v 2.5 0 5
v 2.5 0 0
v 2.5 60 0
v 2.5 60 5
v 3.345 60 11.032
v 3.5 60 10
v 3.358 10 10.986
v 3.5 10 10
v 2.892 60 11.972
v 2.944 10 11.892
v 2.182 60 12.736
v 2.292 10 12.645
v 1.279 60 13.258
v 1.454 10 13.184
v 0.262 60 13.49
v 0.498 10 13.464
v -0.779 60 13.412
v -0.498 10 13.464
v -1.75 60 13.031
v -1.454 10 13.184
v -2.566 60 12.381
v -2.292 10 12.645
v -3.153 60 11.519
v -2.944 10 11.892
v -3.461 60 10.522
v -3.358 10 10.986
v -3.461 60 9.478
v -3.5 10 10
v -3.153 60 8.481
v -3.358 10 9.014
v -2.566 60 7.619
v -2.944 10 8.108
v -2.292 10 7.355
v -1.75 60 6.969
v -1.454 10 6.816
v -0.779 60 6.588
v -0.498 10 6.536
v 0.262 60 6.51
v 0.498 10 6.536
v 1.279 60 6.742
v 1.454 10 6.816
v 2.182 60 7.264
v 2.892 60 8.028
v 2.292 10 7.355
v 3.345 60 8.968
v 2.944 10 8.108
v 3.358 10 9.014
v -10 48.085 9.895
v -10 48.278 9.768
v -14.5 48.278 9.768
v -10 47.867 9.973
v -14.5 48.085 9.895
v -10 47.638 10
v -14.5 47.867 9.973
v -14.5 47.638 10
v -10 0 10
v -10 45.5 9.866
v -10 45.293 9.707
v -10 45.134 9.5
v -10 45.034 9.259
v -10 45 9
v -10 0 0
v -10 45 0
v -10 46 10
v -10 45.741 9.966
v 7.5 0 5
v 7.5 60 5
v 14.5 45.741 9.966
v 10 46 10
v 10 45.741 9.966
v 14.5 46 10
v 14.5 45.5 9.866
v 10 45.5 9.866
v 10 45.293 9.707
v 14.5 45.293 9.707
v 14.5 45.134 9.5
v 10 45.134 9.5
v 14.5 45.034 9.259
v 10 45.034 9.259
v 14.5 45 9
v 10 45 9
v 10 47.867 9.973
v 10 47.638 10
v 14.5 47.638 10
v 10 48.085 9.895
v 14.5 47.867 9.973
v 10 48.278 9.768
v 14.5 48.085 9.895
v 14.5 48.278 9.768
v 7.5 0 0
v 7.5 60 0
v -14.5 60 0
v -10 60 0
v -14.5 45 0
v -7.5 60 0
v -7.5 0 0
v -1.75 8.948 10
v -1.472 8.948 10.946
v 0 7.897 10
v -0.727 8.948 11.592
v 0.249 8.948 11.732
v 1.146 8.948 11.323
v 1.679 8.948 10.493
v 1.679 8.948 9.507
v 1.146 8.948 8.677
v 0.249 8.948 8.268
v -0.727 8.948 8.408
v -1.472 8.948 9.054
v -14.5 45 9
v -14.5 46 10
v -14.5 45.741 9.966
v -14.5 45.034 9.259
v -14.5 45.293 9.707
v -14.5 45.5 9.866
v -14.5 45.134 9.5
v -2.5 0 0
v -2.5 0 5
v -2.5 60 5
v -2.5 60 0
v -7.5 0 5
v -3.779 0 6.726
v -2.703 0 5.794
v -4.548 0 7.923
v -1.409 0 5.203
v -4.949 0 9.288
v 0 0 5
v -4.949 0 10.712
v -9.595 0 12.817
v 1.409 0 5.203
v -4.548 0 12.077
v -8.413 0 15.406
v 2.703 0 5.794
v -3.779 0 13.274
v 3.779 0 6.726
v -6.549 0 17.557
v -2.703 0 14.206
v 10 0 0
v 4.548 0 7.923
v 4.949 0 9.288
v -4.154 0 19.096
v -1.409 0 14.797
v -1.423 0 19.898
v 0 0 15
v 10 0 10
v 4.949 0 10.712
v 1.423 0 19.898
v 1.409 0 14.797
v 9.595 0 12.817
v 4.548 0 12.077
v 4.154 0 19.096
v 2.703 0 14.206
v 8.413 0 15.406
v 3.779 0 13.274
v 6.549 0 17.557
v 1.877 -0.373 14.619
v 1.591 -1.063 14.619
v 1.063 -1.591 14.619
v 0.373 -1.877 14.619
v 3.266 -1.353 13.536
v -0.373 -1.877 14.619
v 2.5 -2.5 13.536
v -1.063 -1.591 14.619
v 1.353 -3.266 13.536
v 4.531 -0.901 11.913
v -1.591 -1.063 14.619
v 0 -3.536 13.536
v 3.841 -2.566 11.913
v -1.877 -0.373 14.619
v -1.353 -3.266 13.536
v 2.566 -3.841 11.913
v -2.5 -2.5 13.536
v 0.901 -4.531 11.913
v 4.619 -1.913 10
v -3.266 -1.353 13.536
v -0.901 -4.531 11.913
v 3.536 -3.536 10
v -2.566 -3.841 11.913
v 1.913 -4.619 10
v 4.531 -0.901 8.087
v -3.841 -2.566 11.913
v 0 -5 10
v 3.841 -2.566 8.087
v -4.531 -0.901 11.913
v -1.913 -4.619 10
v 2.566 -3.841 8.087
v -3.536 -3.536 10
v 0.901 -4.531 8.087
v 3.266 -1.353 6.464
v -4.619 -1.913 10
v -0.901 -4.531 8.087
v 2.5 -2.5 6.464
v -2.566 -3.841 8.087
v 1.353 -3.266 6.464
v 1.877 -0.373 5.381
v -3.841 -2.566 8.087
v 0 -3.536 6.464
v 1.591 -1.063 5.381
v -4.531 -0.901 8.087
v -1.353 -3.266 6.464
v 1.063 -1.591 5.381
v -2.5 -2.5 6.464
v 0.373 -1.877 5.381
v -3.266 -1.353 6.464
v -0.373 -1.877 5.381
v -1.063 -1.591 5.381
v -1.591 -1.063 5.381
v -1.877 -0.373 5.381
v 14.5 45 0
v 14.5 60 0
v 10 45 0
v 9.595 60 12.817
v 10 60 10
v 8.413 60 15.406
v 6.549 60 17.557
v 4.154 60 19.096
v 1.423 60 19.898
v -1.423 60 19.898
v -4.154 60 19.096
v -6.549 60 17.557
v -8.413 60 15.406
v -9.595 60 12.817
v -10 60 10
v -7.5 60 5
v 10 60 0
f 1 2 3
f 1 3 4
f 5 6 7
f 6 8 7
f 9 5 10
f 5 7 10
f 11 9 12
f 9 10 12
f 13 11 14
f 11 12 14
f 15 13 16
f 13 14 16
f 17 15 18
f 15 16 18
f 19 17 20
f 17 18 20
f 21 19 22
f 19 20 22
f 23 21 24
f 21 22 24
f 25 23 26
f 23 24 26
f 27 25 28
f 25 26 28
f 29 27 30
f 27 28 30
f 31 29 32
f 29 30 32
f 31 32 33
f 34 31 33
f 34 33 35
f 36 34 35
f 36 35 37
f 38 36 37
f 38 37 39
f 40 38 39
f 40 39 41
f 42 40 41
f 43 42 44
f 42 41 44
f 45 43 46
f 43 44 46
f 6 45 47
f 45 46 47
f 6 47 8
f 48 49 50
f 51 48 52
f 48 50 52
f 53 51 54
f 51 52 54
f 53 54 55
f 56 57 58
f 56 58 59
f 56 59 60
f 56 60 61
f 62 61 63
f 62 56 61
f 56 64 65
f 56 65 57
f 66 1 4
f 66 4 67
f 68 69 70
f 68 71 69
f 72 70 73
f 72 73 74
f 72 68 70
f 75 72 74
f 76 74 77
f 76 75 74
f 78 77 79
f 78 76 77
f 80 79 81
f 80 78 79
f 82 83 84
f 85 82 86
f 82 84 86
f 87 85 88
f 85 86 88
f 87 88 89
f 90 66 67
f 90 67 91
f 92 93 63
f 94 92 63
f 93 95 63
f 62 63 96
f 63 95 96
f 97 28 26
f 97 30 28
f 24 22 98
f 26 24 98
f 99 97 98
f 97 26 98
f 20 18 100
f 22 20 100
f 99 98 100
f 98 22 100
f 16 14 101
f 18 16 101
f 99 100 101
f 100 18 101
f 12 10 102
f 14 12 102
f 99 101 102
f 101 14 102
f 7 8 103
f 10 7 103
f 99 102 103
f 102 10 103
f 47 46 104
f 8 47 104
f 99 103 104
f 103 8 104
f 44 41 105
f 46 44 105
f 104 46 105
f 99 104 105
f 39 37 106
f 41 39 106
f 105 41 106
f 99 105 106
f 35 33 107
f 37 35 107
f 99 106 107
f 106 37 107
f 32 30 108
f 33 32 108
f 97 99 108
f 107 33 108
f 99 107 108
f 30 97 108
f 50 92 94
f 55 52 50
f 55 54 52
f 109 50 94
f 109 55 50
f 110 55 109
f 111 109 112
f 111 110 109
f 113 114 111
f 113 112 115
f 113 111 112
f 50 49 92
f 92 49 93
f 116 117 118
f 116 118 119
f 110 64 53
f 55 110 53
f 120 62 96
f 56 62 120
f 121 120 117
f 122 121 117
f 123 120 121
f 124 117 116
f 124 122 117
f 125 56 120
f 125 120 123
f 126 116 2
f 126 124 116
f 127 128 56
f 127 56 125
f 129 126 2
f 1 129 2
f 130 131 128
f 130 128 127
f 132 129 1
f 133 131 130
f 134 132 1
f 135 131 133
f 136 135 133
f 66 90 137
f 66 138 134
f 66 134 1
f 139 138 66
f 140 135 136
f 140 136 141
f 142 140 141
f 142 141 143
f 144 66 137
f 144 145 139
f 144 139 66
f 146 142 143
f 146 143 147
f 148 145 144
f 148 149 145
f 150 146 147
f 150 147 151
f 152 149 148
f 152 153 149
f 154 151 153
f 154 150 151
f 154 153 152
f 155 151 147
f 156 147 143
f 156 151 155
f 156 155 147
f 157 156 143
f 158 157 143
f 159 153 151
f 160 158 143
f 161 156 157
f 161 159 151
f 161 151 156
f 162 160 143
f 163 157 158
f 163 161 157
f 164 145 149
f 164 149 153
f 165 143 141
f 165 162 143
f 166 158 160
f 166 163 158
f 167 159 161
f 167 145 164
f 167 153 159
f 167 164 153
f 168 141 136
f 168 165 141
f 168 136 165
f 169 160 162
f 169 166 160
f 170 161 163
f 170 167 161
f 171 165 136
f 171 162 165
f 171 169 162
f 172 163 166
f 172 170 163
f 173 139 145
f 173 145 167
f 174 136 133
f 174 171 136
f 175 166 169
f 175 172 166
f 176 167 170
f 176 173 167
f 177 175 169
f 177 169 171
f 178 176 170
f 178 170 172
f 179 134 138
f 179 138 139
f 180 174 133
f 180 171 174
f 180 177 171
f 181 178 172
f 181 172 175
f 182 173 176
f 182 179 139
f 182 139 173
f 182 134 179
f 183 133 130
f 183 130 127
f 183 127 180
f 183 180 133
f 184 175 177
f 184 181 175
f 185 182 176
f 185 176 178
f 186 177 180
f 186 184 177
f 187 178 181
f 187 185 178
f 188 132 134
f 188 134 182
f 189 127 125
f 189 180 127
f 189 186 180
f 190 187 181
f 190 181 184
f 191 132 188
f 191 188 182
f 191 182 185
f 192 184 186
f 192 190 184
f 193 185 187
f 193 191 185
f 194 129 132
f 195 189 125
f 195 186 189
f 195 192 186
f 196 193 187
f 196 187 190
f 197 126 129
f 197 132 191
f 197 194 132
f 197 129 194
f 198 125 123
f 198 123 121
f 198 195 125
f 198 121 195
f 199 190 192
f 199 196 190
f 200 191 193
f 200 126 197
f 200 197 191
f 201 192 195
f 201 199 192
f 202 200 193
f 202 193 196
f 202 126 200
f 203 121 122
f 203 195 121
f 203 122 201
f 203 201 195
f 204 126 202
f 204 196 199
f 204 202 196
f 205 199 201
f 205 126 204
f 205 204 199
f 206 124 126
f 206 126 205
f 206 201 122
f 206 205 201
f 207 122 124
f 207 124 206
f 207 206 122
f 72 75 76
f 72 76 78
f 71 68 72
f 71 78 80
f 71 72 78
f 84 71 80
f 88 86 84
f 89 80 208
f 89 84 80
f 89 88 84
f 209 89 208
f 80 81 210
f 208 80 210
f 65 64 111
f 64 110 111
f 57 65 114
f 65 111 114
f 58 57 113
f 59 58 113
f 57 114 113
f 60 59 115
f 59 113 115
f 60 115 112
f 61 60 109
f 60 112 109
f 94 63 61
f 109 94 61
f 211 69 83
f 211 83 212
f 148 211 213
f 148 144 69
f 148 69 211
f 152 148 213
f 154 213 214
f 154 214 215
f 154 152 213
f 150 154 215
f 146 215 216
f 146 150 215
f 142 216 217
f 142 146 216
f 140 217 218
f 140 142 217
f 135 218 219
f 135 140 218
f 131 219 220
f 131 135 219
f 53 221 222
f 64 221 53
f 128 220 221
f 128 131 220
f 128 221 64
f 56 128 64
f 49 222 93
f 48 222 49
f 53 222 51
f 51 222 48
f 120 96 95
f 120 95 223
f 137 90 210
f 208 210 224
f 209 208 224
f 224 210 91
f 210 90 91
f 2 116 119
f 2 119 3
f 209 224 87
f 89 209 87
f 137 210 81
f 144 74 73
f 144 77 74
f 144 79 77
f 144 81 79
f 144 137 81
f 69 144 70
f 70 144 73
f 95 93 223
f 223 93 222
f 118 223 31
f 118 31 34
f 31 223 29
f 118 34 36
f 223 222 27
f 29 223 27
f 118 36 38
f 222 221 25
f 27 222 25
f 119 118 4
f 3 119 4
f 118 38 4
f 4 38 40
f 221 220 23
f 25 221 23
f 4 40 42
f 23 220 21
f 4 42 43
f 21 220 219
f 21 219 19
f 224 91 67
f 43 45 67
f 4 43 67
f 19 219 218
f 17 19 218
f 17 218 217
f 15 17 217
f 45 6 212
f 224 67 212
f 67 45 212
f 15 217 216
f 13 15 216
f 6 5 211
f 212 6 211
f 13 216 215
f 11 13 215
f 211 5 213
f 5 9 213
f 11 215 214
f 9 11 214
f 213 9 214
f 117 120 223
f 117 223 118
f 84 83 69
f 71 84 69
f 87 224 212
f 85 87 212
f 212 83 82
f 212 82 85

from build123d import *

# Parameters (mm, degrees)
F1_DEPTH = 60
F5_D     = 7
F5_DEPTH = 50
F5_TIP   = 2.1030121666
F7_DEPTH = 4.5
F9_DEPTH = 4.5
F10_R    = 1


with BuildPart() as f1:
    # F0 (on Front) → F1 (new body)
    with BuildSketch(Plane.XZ):
        with BuildLine():
            Line((-10, 10), (-10, 0))
            Line((-10, 0), (-7.5, 0))
            Line((-7.5, 0), (-7.5, 5))
            Line((-7.5, 5), (-2.5, 5))
            Line((-2.5, 5), (-2.5, 0))
            Line((-2.5, 0), (2.5, 0))
            Line((2.5, 0), (2.5, 5))
            Line((2.5, 5), (7.5, 5))
            Line((7.5, 5), (7.5, 0))
            Line((7.5, 0), (10, 0))
            Line((10, 0), (10, 10))
            ThreePointArc((10, 10), (0, 20), (-10, 10))
        make_face()
    extrude(amount=-F1_DEPTH)

    # F2 (on Right) → F3 (revolve)
    with BuildSketch(Plane.YZ):
        with BuildLine():
            Line((0, 5), (0, 15))
            ThreePointArc((0, 15), (-5, 10), (0, 5))
        make_face()
    revolve(axis=Axis((0, 0, 10), (0, 0, -1)))

    # F5
    with Locations(Plane(origin=(0, 60, 0), x_dir=(-1, 0, 0), z_dir=(0, 1, 0))):
        with Locations((0, 10)):
            Hole(F5_D / 2, depth=F5_DEPTH)
            with Locations((0, 0, -(F5_DEPTH + F5_TIP / 2))):  # 118° drill point
                Cone(0, F5_D / 2, F5_TIP, mode=Mode.SUBTRACT)

    # F6 (on face) → F7 (join)
    with BuildSketch(Plane.YZ.offset(10)):
        Polygon((45, 0), (60, 0), (48, 10), (45, 10), align=None)
    extrude(amount=F7_DEPTH)

    # F8 (on face) → F9 (join)
    with BuildSketch(Plane(origin=(-10, 0, 0), x_dir=(0, -1, 0), z_dir=(-1, 0, 0))):
        Polygon((-48, 10), (-60, 0), (-45, 0), (-45, 10), align=None)
    extrude(amount=F9_DEPTH)

    # F10
    f10_edges = [f1.edges().sort_by_distance(p)[0] for p in [
        (12.25, 45, 10),
        (12.25, 48, 10),
        (-12.25, 45, 10),
        (-12.25, 48, 10),
    ]]
    fillet(f10_edges, radius=F10_R)


solid = f1.part
